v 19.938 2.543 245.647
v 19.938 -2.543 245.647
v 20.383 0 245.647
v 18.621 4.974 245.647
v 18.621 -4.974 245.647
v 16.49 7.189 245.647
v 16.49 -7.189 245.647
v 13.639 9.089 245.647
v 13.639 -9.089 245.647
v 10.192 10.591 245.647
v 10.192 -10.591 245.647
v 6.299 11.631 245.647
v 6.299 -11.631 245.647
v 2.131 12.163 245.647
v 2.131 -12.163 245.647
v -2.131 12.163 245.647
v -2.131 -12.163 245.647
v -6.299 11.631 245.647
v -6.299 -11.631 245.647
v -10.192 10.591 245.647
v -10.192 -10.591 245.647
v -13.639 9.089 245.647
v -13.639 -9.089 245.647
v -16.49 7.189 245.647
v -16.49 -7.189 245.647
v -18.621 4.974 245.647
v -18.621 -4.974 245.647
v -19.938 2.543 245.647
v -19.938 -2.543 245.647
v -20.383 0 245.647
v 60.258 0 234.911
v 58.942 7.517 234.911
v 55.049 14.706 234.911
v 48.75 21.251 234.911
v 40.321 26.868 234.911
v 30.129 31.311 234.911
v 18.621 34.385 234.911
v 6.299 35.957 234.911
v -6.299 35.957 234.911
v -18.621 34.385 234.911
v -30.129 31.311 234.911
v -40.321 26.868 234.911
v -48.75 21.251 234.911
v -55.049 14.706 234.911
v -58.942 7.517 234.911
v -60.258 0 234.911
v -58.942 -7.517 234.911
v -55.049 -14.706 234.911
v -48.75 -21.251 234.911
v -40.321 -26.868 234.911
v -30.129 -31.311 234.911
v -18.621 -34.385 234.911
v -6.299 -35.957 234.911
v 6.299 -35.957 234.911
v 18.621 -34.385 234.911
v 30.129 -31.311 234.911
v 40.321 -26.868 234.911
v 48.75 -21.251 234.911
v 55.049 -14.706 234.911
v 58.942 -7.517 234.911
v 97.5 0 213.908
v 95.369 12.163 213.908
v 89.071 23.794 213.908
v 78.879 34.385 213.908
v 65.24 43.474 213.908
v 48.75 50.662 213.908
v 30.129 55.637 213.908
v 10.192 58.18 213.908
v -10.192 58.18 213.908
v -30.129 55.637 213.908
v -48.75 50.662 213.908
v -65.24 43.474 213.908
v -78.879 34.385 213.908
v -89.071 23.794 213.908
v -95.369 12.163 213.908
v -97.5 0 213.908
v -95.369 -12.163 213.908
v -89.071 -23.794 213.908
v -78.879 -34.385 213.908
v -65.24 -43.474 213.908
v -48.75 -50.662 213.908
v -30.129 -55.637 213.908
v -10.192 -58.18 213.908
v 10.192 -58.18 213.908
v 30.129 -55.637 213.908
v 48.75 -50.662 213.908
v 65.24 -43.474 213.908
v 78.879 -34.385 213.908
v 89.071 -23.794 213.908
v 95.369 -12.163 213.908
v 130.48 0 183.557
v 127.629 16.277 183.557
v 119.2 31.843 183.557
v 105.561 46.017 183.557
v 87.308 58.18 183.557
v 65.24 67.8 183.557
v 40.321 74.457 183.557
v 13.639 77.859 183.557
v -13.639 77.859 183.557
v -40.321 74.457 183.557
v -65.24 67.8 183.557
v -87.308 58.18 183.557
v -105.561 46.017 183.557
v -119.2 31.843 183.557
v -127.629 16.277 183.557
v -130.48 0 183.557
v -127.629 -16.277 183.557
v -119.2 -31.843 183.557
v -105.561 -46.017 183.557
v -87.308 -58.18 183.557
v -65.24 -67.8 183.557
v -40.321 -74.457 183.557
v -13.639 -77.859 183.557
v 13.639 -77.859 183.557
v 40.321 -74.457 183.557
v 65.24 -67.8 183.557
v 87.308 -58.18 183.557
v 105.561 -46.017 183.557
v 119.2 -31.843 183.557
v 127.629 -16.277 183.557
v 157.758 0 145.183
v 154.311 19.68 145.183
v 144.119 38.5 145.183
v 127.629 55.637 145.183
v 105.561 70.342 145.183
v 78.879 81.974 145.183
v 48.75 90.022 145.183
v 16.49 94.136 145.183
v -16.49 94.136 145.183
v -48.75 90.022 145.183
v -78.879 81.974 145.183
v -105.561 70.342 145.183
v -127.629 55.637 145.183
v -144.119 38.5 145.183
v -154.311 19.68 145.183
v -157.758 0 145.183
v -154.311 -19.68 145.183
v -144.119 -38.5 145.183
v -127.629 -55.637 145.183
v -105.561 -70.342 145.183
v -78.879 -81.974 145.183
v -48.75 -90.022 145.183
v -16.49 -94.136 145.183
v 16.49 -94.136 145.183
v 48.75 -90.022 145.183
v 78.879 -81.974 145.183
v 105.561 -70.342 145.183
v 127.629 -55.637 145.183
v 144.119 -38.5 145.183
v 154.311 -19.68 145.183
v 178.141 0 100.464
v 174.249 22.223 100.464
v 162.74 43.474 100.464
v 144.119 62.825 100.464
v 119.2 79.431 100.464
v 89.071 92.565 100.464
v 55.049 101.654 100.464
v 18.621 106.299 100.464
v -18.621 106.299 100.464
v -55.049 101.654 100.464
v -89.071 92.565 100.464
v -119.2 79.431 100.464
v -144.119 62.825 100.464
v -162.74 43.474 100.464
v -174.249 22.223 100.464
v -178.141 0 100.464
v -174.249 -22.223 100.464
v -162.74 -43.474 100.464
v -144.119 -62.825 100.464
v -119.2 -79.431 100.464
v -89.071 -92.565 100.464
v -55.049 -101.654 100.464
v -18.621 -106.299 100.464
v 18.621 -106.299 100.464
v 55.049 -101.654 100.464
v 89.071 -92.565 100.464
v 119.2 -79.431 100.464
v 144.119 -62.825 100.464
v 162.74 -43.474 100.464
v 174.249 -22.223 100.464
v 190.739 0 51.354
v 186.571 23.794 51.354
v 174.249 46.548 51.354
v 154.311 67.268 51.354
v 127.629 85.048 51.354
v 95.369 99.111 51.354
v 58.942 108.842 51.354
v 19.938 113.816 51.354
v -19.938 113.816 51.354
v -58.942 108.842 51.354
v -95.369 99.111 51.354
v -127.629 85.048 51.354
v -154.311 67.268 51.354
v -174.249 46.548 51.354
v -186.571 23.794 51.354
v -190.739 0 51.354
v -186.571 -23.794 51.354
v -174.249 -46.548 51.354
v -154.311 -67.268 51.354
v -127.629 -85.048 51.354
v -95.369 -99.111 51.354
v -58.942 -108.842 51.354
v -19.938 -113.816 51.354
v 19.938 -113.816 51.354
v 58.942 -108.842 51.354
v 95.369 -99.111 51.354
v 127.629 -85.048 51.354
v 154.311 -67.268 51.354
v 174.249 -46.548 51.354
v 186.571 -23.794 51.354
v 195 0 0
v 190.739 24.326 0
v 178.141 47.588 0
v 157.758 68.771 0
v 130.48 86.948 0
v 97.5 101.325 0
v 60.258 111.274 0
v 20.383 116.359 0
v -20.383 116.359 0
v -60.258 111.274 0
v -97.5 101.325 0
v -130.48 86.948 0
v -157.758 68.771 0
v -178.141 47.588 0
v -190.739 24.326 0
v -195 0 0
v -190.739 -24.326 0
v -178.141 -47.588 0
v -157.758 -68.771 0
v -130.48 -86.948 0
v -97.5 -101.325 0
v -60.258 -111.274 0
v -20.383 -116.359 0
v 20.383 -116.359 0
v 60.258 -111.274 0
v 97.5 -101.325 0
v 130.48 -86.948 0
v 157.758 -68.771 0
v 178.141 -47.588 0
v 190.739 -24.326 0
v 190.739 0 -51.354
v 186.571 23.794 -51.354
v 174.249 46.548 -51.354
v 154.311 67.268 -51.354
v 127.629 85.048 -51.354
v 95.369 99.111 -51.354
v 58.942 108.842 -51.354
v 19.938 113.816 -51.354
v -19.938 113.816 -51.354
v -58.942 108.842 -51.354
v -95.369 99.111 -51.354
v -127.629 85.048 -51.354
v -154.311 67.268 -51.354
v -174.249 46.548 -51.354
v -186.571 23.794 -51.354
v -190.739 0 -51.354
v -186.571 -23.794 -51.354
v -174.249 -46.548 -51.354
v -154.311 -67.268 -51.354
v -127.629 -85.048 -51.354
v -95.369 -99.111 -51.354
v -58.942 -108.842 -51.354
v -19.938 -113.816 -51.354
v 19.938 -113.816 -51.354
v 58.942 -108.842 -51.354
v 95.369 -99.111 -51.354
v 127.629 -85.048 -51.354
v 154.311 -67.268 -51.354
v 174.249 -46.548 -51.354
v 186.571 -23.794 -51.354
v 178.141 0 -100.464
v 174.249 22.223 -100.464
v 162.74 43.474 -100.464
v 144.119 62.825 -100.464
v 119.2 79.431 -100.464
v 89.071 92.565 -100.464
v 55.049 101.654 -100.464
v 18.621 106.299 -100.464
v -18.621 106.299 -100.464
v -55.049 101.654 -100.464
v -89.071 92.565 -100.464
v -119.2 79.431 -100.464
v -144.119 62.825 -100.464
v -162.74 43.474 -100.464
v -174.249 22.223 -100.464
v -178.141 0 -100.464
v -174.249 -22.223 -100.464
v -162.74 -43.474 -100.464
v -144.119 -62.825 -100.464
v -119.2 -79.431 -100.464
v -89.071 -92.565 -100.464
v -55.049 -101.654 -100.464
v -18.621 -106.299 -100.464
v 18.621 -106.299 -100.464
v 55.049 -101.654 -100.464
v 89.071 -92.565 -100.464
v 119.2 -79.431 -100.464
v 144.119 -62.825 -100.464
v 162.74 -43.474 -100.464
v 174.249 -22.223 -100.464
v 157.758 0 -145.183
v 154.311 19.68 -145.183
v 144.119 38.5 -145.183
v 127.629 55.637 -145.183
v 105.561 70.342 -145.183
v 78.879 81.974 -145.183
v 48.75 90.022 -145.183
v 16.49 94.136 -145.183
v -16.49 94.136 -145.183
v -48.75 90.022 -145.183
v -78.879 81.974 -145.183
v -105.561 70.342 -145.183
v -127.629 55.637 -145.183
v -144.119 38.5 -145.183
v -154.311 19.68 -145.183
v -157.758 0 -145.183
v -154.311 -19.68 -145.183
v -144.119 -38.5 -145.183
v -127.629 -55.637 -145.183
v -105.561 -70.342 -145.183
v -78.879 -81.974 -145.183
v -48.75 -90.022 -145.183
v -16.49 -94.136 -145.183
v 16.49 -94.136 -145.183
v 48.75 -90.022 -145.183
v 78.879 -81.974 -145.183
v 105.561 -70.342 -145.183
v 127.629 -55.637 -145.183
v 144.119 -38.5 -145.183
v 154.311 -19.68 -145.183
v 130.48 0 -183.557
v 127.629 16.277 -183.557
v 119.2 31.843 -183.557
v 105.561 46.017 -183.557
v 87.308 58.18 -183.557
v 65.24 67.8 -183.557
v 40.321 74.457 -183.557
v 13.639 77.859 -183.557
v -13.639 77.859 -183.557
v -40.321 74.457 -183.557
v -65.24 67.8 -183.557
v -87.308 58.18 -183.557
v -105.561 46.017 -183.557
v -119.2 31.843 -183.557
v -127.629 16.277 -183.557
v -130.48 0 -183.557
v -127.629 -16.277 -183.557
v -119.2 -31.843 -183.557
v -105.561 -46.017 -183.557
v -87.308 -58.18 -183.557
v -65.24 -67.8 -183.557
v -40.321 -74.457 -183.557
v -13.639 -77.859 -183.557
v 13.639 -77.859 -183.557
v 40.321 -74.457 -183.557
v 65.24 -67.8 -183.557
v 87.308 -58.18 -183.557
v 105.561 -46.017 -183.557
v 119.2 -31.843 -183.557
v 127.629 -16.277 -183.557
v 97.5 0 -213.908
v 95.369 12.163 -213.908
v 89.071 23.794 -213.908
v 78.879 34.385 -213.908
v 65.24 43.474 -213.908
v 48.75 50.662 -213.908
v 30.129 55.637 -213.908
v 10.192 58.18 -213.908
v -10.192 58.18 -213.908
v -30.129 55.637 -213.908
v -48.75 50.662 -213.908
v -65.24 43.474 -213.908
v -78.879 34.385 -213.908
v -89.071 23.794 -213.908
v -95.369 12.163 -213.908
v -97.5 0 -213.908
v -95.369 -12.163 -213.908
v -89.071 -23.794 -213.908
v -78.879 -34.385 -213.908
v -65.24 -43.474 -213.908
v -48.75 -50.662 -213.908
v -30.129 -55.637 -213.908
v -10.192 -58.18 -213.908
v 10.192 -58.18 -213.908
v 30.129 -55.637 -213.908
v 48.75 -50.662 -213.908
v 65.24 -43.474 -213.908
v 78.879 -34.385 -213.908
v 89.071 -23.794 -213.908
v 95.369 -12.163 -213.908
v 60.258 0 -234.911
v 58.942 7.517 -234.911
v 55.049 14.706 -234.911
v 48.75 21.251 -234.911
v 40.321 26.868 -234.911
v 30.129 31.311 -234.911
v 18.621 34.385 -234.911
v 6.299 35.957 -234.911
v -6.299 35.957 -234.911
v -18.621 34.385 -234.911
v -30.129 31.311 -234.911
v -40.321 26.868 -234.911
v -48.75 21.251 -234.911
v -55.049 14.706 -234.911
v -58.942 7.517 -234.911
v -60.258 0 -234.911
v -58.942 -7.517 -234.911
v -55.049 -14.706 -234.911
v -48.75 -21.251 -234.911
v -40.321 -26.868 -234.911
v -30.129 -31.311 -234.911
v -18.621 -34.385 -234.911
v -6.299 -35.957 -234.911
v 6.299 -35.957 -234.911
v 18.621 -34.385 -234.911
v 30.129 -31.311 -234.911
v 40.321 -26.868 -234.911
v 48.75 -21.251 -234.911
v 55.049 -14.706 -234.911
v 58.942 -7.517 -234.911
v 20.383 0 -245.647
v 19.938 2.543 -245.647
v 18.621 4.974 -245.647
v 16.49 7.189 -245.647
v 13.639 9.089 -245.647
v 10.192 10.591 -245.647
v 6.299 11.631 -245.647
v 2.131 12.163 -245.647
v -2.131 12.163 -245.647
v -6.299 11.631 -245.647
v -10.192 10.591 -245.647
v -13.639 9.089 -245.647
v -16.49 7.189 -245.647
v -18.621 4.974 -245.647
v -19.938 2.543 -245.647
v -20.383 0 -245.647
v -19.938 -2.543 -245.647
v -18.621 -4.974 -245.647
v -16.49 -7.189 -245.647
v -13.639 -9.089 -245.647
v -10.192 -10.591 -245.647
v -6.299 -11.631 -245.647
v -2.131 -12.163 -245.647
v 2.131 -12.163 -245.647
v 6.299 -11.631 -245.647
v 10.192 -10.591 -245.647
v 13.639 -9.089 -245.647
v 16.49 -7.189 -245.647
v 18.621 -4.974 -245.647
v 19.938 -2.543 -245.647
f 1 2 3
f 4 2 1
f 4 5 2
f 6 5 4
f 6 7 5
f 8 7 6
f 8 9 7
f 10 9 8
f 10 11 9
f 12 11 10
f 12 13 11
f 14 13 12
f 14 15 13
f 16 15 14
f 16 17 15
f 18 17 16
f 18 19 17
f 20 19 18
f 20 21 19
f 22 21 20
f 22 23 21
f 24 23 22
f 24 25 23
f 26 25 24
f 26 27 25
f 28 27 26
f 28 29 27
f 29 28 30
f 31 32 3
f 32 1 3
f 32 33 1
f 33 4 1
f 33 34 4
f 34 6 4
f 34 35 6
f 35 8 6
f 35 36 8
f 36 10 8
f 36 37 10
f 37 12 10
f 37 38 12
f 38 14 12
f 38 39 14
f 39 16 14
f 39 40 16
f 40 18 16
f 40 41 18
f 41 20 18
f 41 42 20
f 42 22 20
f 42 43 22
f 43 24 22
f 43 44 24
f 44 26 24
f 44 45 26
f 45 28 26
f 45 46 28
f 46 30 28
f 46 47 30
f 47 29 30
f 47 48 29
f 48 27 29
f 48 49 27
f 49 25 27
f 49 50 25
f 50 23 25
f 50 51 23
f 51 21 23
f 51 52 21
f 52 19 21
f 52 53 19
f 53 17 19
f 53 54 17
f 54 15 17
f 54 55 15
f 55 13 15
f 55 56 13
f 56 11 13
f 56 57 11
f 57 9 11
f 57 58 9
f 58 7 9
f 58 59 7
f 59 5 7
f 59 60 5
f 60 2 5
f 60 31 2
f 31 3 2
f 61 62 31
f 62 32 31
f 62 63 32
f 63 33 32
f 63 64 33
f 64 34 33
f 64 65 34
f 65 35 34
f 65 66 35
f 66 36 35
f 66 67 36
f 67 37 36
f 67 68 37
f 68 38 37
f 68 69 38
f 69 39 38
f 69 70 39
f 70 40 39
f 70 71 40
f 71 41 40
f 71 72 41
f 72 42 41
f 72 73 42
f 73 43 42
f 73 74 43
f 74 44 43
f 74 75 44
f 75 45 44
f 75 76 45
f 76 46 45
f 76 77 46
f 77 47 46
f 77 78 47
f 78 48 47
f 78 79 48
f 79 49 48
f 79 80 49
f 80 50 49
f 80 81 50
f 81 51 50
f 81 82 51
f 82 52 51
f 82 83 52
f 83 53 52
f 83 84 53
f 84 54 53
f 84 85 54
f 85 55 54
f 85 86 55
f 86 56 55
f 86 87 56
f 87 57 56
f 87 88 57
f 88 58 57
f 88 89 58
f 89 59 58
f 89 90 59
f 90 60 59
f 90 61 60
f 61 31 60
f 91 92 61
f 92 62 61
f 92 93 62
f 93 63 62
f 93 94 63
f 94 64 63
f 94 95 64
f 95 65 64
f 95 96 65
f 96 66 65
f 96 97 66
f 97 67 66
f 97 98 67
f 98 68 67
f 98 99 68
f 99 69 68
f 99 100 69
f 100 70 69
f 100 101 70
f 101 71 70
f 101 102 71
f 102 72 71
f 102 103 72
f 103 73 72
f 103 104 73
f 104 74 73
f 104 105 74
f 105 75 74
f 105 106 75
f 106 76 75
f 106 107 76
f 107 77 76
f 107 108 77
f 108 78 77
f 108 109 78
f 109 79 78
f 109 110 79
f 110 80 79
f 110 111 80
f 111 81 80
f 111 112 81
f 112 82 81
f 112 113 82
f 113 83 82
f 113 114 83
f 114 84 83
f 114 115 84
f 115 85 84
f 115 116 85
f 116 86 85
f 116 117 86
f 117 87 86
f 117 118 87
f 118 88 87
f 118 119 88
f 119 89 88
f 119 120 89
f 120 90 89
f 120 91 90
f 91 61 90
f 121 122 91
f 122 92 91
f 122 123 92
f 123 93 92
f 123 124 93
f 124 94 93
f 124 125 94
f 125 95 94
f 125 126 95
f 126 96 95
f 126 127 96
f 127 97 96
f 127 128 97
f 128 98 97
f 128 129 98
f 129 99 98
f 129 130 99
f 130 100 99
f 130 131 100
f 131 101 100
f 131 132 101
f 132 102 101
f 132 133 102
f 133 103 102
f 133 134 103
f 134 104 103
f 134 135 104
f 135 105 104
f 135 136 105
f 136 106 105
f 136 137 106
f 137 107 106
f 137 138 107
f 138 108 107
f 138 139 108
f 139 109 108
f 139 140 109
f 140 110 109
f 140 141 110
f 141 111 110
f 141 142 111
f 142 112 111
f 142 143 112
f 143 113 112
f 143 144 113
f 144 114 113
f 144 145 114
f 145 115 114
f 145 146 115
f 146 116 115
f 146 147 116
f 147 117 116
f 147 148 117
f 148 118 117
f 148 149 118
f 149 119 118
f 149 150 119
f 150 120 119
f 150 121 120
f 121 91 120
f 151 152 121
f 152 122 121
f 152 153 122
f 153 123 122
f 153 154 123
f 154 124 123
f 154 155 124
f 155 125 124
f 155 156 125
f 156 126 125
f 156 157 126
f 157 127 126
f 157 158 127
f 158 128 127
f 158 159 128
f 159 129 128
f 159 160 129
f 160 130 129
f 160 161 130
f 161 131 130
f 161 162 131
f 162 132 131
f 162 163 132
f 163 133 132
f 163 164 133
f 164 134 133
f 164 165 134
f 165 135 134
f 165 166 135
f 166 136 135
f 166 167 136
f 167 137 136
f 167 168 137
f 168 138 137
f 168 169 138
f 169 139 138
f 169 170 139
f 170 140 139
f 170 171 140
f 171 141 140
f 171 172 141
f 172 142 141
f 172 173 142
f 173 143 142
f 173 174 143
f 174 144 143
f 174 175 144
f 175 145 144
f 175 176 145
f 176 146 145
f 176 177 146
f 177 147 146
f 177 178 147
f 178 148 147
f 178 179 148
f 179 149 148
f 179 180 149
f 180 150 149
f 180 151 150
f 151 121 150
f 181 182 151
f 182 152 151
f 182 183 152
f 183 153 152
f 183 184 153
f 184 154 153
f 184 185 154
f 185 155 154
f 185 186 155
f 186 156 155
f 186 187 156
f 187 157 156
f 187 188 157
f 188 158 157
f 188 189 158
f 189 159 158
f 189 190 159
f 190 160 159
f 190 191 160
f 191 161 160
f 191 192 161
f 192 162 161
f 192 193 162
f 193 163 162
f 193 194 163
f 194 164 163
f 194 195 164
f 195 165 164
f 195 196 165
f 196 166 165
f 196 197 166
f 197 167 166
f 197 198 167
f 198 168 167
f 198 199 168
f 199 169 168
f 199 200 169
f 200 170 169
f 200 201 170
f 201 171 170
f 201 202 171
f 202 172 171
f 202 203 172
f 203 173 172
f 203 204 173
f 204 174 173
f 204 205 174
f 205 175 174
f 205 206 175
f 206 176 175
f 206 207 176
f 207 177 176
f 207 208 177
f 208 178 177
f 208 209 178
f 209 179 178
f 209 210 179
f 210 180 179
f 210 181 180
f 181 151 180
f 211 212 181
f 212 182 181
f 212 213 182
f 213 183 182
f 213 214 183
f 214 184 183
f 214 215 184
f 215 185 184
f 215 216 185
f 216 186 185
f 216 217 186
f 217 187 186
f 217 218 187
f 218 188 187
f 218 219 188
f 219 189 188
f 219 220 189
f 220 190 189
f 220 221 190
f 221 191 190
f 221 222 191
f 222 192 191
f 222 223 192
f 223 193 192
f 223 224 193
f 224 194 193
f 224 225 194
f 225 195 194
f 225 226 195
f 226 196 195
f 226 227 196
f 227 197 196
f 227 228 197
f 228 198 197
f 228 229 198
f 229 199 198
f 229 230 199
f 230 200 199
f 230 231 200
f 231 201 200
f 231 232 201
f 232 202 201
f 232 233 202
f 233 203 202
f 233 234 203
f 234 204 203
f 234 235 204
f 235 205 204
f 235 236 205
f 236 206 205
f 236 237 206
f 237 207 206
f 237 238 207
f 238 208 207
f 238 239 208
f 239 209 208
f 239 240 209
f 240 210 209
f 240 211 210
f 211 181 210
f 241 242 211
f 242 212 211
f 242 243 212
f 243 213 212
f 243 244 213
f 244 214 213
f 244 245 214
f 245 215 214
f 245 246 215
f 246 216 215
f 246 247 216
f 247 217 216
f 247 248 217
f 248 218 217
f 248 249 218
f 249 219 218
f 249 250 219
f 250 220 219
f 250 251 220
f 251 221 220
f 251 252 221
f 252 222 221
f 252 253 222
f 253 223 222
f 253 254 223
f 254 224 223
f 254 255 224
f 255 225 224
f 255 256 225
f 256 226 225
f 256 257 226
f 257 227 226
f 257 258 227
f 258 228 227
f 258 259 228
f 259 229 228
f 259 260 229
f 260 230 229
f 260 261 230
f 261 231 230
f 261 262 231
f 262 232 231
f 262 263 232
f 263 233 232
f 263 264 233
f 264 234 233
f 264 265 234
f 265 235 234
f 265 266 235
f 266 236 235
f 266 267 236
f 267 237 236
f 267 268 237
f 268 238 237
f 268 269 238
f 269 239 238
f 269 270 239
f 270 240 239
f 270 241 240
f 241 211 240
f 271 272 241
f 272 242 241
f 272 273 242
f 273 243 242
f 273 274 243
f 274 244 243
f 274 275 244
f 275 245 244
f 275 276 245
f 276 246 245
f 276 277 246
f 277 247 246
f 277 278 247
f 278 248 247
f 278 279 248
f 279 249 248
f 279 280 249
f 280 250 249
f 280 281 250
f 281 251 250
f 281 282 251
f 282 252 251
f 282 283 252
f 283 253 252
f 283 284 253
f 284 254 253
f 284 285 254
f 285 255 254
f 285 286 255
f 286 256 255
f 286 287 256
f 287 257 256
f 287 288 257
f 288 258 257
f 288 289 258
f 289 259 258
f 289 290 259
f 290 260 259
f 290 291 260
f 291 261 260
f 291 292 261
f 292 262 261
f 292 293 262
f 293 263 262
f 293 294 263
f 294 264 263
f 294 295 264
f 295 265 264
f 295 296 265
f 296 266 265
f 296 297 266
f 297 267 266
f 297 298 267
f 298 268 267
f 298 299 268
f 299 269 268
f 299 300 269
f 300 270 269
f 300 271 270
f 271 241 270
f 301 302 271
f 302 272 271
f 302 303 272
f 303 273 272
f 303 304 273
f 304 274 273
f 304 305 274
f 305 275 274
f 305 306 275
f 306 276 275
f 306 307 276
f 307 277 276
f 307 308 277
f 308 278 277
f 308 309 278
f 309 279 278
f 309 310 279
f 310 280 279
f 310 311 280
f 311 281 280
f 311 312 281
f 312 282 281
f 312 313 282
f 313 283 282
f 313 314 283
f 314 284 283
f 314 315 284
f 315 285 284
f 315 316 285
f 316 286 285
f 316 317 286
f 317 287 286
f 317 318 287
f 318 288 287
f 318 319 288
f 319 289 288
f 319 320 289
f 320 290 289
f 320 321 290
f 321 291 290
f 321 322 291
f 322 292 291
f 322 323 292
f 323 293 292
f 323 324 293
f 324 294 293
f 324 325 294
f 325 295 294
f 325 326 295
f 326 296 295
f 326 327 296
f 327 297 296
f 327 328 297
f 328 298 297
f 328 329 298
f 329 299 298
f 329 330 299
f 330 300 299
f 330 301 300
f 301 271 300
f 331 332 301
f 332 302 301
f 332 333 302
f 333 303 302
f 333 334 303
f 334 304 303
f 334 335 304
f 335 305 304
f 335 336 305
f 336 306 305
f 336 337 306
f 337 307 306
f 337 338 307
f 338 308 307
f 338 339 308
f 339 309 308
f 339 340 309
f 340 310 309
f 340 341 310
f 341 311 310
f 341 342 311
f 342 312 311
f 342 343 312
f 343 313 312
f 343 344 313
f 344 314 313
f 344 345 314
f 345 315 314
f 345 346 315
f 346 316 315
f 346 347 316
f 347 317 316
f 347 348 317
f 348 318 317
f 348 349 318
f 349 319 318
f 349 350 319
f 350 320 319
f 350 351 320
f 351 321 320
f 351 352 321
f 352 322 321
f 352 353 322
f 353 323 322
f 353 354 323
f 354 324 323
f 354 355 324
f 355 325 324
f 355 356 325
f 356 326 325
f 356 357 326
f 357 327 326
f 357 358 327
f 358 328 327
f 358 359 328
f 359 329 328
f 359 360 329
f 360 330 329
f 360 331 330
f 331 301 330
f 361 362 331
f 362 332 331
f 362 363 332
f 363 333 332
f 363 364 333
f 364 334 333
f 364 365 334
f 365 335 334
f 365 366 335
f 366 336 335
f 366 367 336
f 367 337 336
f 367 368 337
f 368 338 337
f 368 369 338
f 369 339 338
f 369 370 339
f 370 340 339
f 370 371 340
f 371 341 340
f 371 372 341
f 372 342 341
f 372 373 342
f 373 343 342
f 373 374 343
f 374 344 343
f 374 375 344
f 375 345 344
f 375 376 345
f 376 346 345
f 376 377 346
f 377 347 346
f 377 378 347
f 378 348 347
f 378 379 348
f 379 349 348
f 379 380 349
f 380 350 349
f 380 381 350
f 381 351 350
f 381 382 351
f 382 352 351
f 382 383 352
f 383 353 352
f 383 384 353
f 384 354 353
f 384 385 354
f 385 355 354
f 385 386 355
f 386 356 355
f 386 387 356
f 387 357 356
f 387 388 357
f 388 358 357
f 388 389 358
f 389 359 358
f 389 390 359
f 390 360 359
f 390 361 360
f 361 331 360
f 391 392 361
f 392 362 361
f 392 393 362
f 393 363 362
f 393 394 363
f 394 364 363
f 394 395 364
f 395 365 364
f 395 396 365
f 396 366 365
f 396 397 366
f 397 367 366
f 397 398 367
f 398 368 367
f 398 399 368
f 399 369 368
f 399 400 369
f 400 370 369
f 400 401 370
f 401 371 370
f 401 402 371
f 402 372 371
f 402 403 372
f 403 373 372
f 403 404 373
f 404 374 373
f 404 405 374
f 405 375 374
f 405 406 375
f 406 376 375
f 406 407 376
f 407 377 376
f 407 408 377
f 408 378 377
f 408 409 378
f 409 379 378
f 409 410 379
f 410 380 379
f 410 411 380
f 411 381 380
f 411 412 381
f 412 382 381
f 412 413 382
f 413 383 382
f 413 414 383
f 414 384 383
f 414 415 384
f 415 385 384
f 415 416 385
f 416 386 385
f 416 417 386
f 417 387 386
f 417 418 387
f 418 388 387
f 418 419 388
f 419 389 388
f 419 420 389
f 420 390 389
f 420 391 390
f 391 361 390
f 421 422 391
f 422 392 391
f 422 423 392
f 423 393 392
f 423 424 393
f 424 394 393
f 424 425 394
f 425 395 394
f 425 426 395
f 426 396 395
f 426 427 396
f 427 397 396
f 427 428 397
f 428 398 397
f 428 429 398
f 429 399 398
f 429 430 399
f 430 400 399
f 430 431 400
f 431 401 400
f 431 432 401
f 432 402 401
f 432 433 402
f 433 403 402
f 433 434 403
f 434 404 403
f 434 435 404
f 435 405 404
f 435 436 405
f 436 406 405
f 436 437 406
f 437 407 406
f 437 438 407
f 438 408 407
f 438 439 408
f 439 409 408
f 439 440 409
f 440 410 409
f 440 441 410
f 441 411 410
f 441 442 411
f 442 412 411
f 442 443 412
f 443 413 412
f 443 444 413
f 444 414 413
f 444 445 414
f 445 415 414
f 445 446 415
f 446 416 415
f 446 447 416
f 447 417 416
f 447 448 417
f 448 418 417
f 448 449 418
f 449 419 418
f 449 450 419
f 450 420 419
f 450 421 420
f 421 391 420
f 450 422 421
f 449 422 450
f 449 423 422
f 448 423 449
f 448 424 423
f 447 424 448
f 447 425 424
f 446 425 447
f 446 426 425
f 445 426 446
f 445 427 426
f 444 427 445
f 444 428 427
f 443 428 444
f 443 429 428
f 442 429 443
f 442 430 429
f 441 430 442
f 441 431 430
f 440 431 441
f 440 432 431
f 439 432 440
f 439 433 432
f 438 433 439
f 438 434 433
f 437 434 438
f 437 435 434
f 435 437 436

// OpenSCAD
// Generated by SolidPython 1.0.1 on 2020-07-29 00:46:52


scale(v = [15, 9, 19]) {
	sphere(r = 13);
}
/***********************************************
*********      SolidPython code:      **********
************************************************
 
# import packages: SolidPython
from solid import *
from solid.utils import *
from itertools import chain, combinations, permutations


class Resize:

    def __init__(self, scad_file):
        self.scad_file = scad_file
        #self.scad_file = import_scad(scad_file)
        # cone/cylinder param:
        self.r1 = 0
        self.r2 = 0
        self.h = 0
        # rectangular prism param:
        self.w = 0
        self.l = 0
        # ellipse param:
        self.r = 0

    # import OpenScad code (file name corresponds to shape)


    # classify shape + parameters
    def assign(self, param1, param2, param3):
        if self.scad_file == 'cone.scad':
            self.r1 = param1
            self.r2 = param2
            self.h = param3
        elif self.scad_file == 'cylinder.scad':
            self.r1 = param1
            self.r2 = param2
            self.h = param3
        elif self.scad_file == 'rectangularPrism.scad':
            self.h = param1
            self.l = param2
            self.w = param3
        else:
            self.r = param1
            self.h = param2

    # resize parameters
    def iterate(self):
        x = range(3, 20, 2)
        i = 1
        if self.scad_file == 'cone.scad':
            tempList = list(permutations(x, 2))
            for temp in tempList:
                param1 = temp[0]
                param2 = temp[1]
                filepath = 'produced_scad_files/' + 'cone' + str(param1) + '_' + str(param2) + '_' + '.scad'
                scad_render_to_file(cylinder(h=param1, r1=param2, r2=0), filepath)

        elif self.scad_file == 'cylinder.scad':
            tempList = list(permutations(x, 3))
            for temp in tempList:
                param1 = temp[0]
                param2 = temp[1]
                filepath = 'produced_scad_files/' + 'cylinder' + str(param1) + '_' + str(param2) + '_' + '.scad'
                scad_render_to_file(cylinder(h=param1, r1=param2, r2=param2), filepath)

        elif self.scad_file == 'rectangularPrism.scad':
            tempList = list(permutations(x, 3))
            for temp in tempList:
                param1 = temp[0]
                param2 = temp[1]
                param3 = temp[2]
                filepath = 'produced_scad_files/' + 'rectangularPrism' + str(param1) + '_' + str(param2) + '_' + str(
                    param3) + '.scad'
                scad_render_to_file(cube(size=(param1, param2, param3)), filepath)

        elif self.scad_file == 'ellipse.scad':
            tempList = list(permutations(x, 4))
            for temp in tempList:
                param1 = temp[0]
                param2 = temp[1]
                param3 = temp[2]
                param4 = temp[3]
                filepath = 'produced_scad_files/' + 'ellipse' + str(param1) + '_' + str(param2) + '_' + str(param3) + '_' + str(param4) + '.scad'
                scad_render_to_file(scale([param1, param2, param3])(sphere(r=param4)), filepath)

    def render_to_scadfile(self):
        scad_render_to_file(scad, 'example.scad') 
 
************************************************/
